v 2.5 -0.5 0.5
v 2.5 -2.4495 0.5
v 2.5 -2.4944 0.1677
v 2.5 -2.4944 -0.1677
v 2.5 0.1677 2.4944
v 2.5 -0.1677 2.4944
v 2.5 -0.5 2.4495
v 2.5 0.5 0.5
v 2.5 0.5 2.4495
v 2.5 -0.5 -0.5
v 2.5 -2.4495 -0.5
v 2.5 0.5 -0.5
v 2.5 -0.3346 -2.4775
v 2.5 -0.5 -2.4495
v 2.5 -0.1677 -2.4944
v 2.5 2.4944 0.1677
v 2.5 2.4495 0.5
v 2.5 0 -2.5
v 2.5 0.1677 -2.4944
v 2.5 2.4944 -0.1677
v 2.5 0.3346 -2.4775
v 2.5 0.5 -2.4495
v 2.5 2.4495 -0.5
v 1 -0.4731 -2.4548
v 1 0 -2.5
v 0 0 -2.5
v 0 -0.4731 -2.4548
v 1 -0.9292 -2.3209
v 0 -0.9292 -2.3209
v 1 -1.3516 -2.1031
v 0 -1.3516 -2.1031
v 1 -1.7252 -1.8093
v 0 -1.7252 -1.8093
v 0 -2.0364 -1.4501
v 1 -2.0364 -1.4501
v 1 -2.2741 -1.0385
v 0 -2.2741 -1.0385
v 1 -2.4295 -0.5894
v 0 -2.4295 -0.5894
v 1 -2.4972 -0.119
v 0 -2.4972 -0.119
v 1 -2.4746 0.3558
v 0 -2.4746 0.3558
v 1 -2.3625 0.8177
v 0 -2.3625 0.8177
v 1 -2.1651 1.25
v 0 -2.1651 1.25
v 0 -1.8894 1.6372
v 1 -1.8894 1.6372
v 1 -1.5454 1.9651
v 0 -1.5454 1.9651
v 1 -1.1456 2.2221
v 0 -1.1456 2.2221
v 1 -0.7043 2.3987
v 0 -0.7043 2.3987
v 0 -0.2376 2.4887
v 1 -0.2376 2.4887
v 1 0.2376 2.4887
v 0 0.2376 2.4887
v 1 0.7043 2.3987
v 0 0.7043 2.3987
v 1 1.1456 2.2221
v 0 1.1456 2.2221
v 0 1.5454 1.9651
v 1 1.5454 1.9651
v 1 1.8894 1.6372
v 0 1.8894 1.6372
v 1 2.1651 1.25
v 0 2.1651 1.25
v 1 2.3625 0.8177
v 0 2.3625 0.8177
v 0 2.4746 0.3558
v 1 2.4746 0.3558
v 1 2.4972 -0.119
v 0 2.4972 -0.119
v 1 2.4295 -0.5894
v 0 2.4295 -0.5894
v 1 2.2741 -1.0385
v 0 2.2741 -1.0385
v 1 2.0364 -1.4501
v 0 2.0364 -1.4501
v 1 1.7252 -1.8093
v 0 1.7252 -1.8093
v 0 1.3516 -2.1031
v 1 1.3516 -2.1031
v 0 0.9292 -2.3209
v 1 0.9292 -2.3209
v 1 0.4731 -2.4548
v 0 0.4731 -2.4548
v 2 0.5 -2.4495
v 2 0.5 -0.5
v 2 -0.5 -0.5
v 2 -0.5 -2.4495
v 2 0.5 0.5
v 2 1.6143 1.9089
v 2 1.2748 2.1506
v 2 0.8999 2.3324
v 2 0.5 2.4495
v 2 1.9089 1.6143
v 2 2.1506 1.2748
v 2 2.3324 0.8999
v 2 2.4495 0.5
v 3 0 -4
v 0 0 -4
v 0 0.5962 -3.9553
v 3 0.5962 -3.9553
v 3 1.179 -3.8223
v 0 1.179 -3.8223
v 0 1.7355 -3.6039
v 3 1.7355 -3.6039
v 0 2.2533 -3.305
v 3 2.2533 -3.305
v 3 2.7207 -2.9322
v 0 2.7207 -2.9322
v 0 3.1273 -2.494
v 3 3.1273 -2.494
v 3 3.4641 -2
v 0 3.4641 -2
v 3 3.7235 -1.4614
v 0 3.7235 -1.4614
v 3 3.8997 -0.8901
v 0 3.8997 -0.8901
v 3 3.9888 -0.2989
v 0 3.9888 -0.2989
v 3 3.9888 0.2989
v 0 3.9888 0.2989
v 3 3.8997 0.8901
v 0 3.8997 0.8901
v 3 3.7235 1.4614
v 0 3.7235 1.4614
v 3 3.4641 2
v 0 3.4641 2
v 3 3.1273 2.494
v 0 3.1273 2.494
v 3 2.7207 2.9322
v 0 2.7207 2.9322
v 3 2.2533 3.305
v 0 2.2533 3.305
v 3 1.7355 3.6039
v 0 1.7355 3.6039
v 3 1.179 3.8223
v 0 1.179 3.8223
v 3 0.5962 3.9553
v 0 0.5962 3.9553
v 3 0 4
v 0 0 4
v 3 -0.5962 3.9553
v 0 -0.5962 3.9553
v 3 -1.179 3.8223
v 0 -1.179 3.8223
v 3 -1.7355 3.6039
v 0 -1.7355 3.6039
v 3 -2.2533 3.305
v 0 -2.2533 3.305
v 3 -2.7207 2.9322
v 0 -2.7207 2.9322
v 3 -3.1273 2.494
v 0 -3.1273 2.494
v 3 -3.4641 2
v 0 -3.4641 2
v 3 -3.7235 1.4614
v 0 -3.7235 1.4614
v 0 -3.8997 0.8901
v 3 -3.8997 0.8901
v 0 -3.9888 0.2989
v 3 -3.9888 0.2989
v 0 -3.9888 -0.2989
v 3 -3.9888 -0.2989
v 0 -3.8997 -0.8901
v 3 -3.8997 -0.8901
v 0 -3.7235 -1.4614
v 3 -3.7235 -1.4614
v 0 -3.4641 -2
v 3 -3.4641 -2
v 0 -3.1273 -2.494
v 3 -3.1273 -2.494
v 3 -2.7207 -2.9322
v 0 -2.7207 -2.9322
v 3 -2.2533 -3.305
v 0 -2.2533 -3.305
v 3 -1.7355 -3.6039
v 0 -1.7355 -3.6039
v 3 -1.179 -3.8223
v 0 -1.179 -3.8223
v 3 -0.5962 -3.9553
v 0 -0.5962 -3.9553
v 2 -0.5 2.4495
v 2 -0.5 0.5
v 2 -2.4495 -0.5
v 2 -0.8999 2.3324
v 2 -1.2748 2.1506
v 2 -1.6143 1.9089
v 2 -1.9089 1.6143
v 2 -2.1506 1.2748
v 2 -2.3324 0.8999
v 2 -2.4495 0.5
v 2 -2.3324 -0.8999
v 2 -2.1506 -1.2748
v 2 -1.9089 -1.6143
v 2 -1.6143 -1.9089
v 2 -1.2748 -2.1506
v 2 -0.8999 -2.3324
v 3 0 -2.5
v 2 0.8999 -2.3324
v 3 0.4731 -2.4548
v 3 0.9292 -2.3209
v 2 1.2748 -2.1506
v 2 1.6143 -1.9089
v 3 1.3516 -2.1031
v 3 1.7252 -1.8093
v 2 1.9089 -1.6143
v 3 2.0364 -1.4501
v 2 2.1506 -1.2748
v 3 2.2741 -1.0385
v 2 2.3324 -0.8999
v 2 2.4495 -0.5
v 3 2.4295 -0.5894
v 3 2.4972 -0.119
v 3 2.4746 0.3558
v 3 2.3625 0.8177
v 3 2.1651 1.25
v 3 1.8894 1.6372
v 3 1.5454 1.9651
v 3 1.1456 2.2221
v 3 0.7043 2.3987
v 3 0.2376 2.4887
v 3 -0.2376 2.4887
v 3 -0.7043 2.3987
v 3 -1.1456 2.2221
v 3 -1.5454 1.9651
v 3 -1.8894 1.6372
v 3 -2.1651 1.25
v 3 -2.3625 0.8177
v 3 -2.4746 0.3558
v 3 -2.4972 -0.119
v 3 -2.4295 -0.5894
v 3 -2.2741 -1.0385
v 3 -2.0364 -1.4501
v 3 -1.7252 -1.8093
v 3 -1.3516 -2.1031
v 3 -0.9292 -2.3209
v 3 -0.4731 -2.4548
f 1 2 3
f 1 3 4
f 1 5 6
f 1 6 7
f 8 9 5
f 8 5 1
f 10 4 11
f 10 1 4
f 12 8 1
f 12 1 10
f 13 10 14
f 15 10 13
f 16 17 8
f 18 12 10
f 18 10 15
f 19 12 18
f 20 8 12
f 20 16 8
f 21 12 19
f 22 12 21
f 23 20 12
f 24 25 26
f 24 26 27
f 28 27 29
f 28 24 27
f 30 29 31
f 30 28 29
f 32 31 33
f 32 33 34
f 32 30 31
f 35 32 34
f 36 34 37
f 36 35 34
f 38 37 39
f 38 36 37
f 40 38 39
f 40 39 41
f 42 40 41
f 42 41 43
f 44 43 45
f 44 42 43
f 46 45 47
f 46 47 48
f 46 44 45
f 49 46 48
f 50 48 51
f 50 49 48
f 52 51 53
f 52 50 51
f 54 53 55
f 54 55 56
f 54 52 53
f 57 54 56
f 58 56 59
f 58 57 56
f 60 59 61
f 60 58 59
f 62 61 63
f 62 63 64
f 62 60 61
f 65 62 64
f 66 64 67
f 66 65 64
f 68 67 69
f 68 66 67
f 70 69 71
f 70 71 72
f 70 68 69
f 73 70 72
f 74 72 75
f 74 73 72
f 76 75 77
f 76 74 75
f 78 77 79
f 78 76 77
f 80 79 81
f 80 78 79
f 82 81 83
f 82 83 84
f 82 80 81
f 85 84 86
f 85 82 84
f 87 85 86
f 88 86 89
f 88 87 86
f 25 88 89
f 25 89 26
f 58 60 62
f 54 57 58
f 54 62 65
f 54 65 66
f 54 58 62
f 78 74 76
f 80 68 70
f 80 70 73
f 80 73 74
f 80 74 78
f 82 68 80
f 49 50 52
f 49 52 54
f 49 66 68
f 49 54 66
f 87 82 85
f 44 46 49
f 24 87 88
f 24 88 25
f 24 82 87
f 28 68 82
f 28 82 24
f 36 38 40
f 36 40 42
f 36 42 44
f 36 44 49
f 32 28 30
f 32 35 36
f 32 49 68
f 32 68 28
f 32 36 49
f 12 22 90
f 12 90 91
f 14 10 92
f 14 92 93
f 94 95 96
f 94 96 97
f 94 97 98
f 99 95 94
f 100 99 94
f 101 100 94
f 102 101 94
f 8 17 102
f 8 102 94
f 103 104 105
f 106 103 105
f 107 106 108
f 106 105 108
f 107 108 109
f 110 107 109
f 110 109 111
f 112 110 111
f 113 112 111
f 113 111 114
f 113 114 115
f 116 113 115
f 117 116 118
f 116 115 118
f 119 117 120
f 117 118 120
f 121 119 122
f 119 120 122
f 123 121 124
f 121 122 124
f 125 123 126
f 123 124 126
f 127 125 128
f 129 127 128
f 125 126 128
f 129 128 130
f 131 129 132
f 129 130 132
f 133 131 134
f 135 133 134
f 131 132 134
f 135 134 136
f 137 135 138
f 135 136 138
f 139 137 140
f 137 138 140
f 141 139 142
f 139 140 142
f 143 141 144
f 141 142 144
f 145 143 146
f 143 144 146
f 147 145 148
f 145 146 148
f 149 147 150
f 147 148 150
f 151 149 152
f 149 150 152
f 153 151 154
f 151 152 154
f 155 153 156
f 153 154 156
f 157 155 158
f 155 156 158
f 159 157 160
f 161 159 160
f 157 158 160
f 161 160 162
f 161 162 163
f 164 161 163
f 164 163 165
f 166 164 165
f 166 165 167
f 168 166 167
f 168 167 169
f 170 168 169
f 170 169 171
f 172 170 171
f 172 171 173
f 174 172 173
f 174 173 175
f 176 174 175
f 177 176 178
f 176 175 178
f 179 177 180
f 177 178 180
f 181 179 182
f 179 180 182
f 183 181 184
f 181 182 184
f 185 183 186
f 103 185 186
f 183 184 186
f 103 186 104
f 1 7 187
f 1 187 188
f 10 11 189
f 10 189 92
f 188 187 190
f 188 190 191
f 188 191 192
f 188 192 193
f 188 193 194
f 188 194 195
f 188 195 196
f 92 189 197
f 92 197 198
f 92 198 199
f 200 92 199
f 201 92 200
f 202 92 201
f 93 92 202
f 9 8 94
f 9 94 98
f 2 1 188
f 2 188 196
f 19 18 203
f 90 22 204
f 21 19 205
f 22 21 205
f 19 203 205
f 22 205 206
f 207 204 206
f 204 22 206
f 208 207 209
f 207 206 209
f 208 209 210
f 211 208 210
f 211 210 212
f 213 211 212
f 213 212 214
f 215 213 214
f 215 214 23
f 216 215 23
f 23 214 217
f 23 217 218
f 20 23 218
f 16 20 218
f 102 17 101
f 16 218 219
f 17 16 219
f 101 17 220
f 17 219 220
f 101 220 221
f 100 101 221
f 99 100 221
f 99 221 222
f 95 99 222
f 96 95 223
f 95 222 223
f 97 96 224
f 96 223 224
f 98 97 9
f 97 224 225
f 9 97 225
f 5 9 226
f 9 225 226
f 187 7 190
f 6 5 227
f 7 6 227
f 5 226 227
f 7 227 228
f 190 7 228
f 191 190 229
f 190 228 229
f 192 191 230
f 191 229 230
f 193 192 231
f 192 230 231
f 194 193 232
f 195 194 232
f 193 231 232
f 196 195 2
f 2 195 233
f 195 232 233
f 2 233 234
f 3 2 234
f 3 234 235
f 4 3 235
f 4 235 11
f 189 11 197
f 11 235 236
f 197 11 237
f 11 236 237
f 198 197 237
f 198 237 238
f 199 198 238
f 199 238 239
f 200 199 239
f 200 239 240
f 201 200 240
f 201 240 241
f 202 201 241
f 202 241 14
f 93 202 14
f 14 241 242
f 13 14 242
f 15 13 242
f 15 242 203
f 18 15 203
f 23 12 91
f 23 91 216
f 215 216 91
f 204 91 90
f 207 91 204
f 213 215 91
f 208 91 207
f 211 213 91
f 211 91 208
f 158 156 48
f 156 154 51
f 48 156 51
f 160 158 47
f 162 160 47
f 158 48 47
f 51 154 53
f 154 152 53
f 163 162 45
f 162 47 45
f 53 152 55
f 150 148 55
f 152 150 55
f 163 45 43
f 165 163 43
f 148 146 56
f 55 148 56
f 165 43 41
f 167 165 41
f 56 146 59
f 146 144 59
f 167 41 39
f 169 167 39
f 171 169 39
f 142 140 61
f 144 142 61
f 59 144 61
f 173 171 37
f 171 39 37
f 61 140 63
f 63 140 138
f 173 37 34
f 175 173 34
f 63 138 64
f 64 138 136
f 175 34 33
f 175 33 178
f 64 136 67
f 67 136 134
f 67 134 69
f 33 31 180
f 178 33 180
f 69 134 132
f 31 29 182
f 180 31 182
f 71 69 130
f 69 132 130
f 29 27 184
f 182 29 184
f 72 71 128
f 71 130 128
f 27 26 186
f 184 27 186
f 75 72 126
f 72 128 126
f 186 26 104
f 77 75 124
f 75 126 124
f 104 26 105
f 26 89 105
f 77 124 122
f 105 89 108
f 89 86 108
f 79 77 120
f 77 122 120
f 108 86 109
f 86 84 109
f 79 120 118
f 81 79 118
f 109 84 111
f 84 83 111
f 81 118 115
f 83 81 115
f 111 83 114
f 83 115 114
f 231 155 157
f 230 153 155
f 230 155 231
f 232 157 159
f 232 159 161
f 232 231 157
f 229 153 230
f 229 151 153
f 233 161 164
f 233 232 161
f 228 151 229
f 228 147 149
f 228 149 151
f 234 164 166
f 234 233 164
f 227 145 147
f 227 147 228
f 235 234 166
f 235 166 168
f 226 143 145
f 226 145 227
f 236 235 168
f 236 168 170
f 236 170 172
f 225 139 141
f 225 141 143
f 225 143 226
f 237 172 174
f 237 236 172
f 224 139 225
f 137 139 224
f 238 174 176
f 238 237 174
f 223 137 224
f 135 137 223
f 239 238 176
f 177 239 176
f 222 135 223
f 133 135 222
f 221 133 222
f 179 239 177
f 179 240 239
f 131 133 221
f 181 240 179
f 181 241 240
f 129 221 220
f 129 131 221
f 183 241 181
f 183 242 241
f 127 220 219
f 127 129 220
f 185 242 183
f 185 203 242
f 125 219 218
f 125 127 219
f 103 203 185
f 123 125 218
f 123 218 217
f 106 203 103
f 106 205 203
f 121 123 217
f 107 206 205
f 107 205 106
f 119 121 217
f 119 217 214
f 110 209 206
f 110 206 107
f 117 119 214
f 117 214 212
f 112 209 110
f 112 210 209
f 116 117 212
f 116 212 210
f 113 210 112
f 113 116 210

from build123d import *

# Parameters (mm, degrees)
SKETCH_1_R          = 4
EXTRUDE_1_DEPTH     = 3
SKETCH_2_R          = 2.5
CUT_EXTRUDE_1_DEPTH = 1
CUT_EXTRUDE_START   = -1
SKETCH_3_R          = 2.5
CUT_EXTRUDE_2_DEPTH = 1
EXTRUDE_START       = 0.5
EXTRUDE_2_DEPTH     = 0.5


with BuildPart() as part:
    # 草图1 → 凸台-拉伸1 (new body)
    with BuildSketch(Plane(origin=(0, 0, 0), x_dir=(0, 0, -1), z_dir=(1, 0, 0))):
        Circle(SKETCH_1_R)
    extrude(amount=EXTRUDE_1_DEPTH)

    # 草图2 → 切除-拉伸1 (cut)
    with BuildSketch(Plane(origin=(3, 0, 0), x_dir=(0, 0, -1), z_dir=(1, 0, 0))):
        Circle(SKETCH_2_R)
    extrude(amount=-CUT_EXTRUDE_1_DEPTH, mode=Mode.SUBTRACT)

    # 草图3 → 切除-拉伸2 (cut)
    with BuildSketch(Plane.ZY.offset(CUT_EXTRUDE_START)):
        with Locations(Location((0, 0, 0), (0, 0, 180))):
            Circle(SKETCH_3_R)
    extrude(amount=CUT_EXTRUDE_2_DEPTH, mode=Mode.SUBTRACT)

    # 草图4 → 凸台-拉伸2 (add)
    with BuildSketch(Plane(origin=(2, 0, 0), x_dir=(0, 0, -1), z_dir=(1, 0, 0)).offset(EXTRUDE_START)):
        with BuildLine():
            Line((-0.5, -0.5), (-0.5, -2.449489743))
            ThreePointArc((-0.5, -2.449489743), (0, -2.5), (0.5, -2.449489743))
            Line((0.5, -2.449489743), (0.5, -0.5))
            Line((0.5, -0.5), (2.449489743, -0.5))
            ThreePointArc((2.449489743, -0.5), (2.5, 0), (2.449489743, 0.5))
            Line((2.449489743, 0.5), (0.5, 0.5))
            Line((0.5, 0.5), (0.5, 2.449489743))
            ThreePointArc((0.5, 2.449489743), (0, 2.5), (-0.5, 2.449489743))
            Line((-0.5, 2.449489743), (-0.5, 0.5))
            Line((-0.5, 0.5), (-2.449489743, 0.5))
            ThreePointArc((-2.449489743, 0.5), (-2.5, 0), (-2.449489743, -0.5))
            Line((-2.449489743, -0.5), (-0.5, -0.5))
        make_face()
    extrude(amount=-EXTRUDE_2_DEPTH)


solid = part.part
